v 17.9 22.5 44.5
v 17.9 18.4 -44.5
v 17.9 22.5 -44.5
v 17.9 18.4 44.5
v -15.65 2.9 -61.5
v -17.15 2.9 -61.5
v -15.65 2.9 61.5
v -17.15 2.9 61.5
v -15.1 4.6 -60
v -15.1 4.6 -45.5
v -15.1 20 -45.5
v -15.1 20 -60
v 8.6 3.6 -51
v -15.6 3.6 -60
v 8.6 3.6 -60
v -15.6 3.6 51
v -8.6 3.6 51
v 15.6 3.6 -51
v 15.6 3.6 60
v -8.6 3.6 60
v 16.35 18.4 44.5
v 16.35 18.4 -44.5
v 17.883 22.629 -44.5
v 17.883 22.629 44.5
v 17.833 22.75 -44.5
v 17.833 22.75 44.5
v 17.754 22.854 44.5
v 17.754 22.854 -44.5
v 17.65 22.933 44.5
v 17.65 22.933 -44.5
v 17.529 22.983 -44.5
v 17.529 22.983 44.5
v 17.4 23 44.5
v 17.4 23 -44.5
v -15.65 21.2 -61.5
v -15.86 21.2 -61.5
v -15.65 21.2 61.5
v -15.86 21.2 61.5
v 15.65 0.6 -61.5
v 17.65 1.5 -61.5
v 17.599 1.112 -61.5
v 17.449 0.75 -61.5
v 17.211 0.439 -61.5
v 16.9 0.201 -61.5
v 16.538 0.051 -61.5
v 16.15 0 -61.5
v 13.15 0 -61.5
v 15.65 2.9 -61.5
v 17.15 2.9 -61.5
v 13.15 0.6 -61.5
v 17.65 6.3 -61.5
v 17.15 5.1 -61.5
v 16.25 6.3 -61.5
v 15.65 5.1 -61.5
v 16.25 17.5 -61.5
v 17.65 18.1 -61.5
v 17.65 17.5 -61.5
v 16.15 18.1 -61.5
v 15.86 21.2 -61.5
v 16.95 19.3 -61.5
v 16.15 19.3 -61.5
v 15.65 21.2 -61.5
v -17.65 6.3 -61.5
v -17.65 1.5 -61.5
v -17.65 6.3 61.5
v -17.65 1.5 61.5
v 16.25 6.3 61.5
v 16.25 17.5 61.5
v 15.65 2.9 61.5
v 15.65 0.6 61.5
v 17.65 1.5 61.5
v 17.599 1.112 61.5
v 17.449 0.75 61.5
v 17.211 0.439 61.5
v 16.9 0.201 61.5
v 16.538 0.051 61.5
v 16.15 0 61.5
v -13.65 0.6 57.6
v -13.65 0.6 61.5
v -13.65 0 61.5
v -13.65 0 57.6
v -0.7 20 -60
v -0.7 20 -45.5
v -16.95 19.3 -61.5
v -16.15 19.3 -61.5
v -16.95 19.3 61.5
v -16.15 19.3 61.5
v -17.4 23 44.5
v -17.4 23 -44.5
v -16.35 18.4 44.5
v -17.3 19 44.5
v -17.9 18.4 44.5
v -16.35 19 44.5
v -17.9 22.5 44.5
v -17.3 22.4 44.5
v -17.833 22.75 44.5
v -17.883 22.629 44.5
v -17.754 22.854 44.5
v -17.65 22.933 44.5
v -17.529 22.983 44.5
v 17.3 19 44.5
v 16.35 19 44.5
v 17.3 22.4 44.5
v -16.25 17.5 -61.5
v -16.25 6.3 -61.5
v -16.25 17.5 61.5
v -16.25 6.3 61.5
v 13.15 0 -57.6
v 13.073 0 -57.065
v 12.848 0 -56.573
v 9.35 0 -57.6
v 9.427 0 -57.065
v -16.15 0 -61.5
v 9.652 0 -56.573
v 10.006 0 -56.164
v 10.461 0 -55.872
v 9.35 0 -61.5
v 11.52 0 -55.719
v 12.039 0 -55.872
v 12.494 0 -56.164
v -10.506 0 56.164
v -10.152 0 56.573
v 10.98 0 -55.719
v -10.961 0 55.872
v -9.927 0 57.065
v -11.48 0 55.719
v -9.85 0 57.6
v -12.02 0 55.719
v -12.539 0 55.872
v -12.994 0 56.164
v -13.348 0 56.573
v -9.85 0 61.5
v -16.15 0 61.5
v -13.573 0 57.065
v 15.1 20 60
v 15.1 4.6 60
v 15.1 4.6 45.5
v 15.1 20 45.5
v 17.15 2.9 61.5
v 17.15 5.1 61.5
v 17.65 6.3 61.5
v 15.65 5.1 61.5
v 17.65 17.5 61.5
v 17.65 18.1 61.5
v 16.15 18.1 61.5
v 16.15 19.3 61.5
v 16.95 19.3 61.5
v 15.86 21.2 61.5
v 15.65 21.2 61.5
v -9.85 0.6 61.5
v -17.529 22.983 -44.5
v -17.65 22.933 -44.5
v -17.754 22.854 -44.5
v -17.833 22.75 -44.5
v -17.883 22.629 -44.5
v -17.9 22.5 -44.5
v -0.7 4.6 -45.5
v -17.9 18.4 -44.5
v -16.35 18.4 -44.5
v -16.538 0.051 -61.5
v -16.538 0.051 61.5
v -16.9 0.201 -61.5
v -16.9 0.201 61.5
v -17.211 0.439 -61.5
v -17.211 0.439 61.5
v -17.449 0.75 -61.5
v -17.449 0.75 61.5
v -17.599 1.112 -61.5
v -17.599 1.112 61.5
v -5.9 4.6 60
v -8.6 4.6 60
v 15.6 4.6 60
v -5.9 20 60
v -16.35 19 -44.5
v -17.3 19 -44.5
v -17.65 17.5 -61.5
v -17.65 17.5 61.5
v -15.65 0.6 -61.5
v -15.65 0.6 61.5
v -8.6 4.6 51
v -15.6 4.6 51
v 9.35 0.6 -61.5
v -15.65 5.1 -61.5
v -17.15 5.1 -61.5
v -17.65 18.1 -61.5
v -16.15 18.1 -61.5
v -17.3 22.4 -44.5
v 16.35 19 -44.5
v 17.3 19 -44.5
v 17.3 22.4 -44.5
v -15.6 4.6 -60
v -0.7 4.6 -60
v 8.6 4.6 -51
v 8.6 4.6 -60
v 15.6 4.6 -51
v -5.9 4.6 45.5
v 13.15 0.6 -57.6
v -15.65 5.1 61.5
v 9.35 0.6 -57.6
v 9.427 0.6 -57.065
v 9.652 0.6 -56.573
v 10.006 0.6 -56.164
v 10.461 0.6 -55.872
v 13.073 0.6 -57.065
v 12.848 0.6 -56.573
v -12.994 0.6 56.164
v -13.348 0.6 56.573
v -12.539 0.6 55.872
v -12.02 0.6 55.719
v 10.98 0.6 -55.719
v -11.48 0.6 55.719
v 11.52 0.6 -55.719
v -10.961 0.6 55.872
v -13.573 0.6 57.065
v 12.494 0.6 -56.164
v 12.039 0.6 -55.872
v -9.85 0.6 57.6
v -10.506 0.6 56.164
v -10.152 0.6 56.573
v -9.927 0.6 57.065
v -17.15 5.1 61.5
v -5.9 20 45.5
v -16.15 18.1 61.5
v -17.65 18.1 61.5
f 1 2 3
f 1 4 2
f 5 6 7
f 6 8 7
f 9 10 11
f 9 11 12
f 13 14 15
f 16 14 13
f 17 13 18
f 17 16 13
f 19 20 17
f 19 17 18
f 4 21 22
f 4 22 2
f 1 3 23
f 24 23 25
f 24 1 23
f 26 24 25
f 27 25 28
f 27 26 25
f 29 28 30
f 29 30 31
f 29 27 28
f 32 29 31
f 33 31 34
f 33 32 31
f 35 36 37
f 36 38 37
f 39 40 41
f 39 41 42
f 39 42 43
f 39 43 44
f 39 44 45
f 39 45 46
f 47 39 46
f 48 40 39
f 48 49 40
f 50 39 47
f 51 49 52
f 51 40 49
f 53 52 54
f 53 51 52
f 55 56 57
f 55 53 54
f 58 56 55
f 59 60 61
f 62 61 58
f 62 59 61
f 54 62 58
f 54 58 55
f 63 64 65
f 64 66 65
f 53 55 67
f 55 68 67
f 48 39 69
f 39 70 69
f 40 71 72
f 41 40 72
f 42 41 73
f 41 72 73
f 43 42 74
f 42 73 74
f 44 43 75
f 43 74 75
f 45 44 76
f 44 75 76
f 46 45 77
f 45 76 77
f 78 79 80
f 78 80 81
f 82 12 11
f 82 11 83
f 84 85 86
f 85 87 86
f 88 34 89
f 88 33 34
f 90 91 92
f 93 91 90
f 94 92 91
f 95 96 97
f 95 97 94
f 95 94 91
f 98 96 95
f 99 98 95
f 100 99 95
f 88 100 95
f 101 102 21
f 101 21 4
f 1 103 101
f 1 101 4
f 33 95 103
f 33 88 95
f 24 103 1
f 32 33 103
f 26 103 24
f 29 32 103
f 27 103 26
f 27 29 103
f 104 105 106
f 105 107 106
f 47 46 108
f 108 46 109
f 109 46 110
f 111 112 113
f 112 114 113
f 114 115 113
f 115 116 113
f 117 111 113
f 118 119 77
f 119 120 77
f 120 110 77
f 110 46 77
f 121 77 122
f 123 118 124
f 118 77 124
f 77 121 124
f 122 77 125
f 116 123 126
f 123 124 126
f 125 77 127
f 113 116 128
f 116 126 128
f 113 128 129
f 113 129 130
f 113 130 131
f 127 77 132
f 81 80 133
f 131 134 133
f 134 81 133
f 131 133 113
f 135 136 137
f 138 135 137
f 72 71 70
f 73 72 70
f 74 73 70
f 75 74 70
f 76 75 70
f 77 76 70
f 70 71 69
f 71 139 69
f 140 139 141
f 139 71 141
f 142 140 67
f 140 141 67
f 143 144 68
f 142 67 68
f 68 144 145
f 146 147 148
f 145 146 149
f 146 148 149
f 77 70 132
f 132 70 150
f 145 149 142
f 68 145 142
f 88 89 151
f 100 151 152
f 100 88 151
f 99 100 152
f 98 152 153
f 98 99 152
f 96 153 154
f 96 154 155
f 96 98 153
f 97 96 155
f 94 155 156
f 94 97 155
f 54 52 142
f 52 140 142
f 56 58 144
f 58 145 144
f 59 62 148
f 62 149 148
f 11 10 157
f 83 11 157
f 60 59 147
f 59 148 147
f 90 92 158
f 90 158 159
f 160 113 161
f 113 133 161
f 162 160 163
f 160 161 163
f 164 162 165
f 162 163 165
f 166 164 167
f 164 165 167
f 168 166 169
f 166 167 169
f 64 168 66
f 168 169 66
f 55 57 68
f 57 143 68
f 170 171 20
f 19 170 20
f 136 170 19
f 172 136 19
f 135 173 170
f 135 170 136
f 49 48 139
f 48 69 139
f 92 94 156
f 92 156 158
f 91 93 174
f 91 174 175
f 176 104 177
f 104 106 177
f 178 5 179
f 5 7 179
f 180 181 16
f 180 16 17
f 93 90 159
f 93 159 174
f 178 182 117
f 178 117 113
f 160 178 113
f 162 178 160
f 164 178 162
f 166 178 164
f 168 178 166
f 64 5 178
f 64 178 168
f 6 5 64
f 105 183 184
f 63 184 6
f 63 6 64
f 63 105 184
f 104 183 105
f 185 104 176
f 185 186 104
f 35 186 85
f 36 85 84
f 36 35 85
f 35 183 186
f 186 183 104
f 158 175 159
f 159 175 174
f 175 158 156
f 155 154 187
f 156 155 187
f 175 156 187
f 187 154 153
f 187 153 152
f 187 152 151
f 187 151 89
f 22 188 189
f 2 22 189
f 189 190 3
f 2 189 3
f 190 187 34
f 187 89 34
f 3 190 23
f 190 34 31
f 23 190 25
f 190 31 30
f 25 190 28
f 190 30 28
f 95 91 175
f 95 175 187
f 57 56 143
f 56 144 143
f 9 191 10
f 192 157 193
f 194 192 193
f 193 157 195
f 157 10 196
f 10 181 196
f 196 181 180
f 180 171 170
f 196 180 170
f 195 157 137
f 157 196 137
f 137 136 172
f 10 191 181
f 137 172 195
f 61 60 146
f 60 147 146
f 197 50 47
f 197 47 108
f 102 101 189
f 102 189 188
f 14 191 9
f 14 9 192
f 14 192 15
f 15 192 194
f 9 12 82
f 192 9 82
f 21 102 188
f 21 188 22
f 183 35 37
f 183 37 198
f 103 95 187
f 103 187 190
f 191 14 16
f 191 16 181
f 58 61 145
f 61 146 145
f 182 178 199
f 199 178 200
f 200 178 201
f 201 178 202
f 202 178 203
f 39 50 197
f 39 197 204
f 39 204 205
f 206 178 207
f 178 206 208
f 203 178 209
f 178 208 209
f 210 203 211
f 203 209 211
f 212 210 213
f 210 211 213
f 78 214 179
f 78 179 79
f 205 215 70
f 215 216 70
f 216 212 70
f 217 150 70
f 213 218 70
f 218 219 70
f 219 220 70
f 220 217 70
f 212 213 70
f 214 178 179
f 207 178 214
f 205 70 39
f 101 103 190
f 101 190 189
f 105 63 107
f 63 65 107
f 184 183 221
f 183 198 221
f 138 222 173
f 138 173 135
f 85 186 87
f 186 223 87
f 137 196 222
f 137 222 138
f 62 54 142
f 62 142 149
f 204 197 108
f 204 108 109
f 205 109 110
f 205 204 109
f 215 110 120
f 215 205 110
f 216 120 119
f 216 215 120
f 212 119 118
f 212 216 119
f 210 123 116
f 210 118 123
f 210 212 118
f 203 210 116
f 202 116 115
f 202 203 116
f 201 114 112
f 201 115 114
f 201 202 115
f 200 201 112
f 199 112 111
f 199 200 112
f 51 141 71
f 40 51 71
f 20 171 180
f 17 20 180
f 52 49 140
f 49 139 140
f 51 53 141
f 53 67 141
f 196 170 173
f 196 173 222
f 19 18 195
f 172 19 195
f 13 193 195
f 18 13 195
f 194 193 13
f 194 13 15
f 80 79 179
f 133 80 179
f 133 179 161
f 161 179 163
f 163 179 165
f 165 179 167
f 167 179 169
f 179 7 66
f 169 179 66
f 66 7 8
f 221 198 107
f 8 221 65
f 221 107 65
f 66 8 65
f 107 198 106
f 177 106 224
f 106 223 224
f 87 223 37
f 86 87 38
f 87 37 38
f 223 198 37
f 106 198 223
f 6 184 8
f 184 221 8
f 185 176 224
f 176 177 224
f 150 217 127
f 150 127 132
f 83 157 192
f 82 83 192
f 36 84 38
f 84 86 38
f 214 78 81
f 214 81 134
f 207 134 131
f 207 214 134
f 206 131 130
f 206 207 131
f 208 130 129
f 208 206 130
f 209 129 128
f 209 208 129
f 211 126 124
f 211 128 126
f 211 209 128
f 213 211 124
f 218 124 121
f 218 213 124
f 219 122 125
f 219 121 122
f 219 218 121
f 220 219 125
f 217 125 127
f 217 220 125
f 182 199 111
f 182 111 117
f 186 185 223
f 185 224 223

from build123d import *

# Parameters (mm, degrees)
EXTRUDE_1_DEPTH     = 61.5
EXTRUDE_2_DEPTH     = 44.5
SKETCH_4_W          = 31.2
SKETCH_4_H          = 1
EXTRUDE_3_DEPTH     = 60
SKETCH_5_W          = 14.4
SKETCH_5_H          = 14.5
SKETCH_5_W_2        = 21
EXTRUDE_4_DEPTH     = 15.4
SKETCH_6_W          = 7
SKETCH_6_H          = 9
CUT_EXTRUDE_1_DEPTH = 67.642478945
CUT_EXTRUDE_2_DEPTH = 68.85587668


with BuildPart() as part:
    # 草圖2 → 填料-伸長1 (new, symmetric)
    with BuildSketch(Plane.XY):
        with BuildLine():
            Line((16.15, 0), (-16.15, 0))
            ThreePointArc((-16.15, 0), (-17.210660172, 0.439339828), (-17.65, 1.5))
            Line((-17.65, 1.5), (-17.65, 6.3))
            Line((-17.65, 6.3), (-16.25, 6.3))
            Line((-16.25, 6.3), (-16.25, 17.5))
            Line((-16.25, 17.5), (-17.65, 17.5))
            Line((-17.65, 17.5), (-17.65, 18.1))
            Line((-17.65, 18.1), (-16.15, 18.1))
            Line((-16.15, 18.1), (-16.15, 19.3))
            Line((-16.15, 19.3), (-16.95, 19.3))
            Line((-16.95, 19.3), (-15.86, 21.2))
            Line((-15.86, 21.2), (-15.65, 21.2))
            Line((-15.65, 21.2), (-15.65, 5.1))
            Line((-15.65, 5.1), (-17.15, 5.1))
            Line((-17.15, 5.1), (-17.15, 2.9))
            Line((-17.15, 2.9), (-15.65, 2.9))
            Line((-15.65, 2.9), (-15.65, 0.6))
            Line((-15.65, 0.6), (15.65, 0.6))
            Line((15.65, 0.6), (15.65, 2.9))
            Line((15.65, 2.9), (17.15, 2.9))
            Line((17.15, 2.9), (17.15, 5.1))
            Line((17.15, 5.1), (15.65, 5.1))
            Line((15.65, 5.1), (15.65, 21.2))
            Line((15.65, 21.2), (15.86, 21.2))
            Line((15.86, 21.2), (16.95, 19.3))
            Line((16.95, 19.3), (16.15, 19.3))
            Line((16.15, 19.3), (16.15, 18.1))
            Line((16.15, 18.1), (17.65, 18.1))
            Line((17.65, 18.1), (17.65, 17.5))
            Line((17.65, 17.5), (16.25, 17.5))
            Line((16.25, 17.5), (16.25, 6.3))
            Line((16.25, 6.3), (17.65, 6.3))
            Line((17.65, 6.3), (17.65, 1.5))
            ThreePointArc((17.65, 1.5), (17.210660172, 0.439339828), (16.15, 0))
        make_face()
    extrude(amount=EXTRUDE_1_DEPTH, both=True)

    # 草圖7 → 除料-伸長2 (cut, through all)
    with BuildSketch(Plane(origin=(0, 0.6, 0), x_dir=(1, 0, 0), z_dir=(0, 1, 0))):
        with BuildLine():
            Line((9.35, 61.5), (13.15, 61.5))
            Line((13.15, 61.5), (13.15, 57.6))
            ThreePointArc((13.15, 57.6), (11.25, 55.7), (9.35, 57.6))
            Line((9.35, 57.6), (9.35, 61.5))
        make_face()
        with BuildLine():
            Line((-13.65, -61.5), (-13.65, -57.6))
            ThreePointArc((-13.65, -57.6), (-11.75, -55.7), (-9.85, -57.6))
            Line((-9.85, -57.6), (-9.85, -61.5))
            Line((-9.85, -61.5), (-13.65, -61.5))
        make_face()
    extrude(amount=-CUT_EXTRUDE_2_DEPTH, mode=Mode.SUBTRACT)


with BuildPart() as body_2:
    # 草圖3 → 填料-伸長2 (new, symmetric)
    with BuildSketch(Plane.XY):
        with BuildLine():
            Line((17.4, 23), (-17.4, 23))
            ThreePointArc((-17.4, 23), (-17.753553391, 22.853553391), (-17.9, 22.5))
            Line((-17.9, 22.5), (-17.9, 18.4))
            Line((-17.9, 18.4), (-16.35, 18.4))
            Line((-16.35, 18.4), (-16.35, 19))
            Line((-16.35, 19), (-17.3, 19))
            Line((-17.3, 19), (-17.3, 22.4))
            Line((-17.3, 22.4), (17.3, 22.4))
            Line((17.3, 22.4), (17.3, 19))
            Line((17.3, 19), (16.35, 19))
            Line((16.35, 19), (16.35, 18.4))
            Line((16.35, 18.4), (17.9, 18.4))
            Line((17.9, 18.4), (17.9, 22.5))
            ThreePointArc((17.9, 22.5), (17.753553391, 22.853553391), (17.4, 23))
        make_face()
    extrude(amount=EXTRUDE_2_DEPTH, both=True)


with BuildPart() as body_3:
    # 草圖4 → 填料-伸長3 (new, symmetric)
    with BuildSketch(Plane.XY):
        with Locations((0, 4.1)):
            Rectangle(SKETCH_4_W, SKETCH_4_H)
    extrude(amount=EXTRUDE_3_DEPTH, both=True)

    # 草圖5 → 填料-伸長4 (add)
    with BuildSketch(Plane(origin=(0, 4.6, 0), x_dir=(1, 0, 0), z_dir=(0, 1, 0))):
        with Locations((-7.9, 52.75)):
            Rectangle(SKETCH_5_W, SKETCH_5_H)
        with Locations((4.6, -52.75)):
            Rectangle(SKETCH_5_W_2, SKETCH_5_H)
    extrude(amount=EXTRUDE_4_DEPTH)

    # 草圖6 → 除料-伸長1 (cut, through all)
    with BuildSketch(Plane(origin=(0, 4.6, 0), x_dir=(1, 0, 0), z_dir=(0, 1, 0))):
        with Locations((12.1, 55.5)):
            Rectangle(SKETCH_6_W, SKETCH_6_H)
        with Locations((-12.1, -55.5)):
            Rectangle(SKETCH_6_W, SKETCH_6_H)
    extrude(amount=-CUT_EXTRUDE_1_DEPTH, mode=Mode.SUBTRACT)


solid = Compound([part.part, body_2.part, body_3.part])
